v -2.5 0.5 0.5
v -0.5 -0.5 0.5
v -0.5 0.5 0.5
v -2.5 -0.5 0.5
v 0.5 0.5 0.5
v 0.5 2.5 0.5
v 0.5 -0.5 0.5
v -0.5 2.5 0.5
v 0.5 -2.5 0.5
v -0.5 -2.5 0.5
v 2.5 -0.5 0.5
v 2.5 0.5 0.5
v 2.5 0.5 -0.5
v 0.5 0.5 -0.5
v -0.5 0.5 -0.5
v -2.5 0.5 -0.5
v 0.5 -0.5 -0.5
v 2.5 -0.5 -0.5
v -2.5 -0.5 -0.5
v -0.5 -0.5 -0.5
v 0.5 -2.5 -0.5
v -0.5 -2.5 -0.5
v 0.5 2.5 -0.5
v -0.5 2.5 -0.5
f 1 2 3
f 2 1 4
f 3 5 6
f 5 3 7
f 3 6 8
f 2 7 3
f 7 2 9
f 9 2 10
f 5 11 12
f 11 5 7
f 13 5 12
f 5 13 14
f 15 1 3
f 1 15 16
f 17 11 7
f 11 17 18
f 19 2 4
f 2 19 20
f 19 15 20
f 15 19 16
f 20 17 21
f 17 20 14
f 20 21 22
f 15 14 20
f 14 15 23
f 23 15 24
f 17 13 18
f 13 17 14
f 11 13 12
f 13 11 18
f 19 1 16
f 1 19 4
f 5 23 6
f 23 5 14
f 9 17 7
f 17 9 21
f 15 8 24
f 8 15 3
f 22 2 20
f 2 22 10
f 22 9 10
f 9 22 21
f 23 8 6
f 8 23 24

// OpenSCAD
// Causes a CGAL assertion in CGALEvaluator::process()
e=0.000;
for (m = [ [ [ 0, 1, 0], [ 0, 0, 1], [ 1, 0, 0] ],
       [ [-1, 0, e], [ 0,-1, 0], [ 0, 0,-1] ] ] )
    multmatrix (m) cube([1,5,1], center=true);
